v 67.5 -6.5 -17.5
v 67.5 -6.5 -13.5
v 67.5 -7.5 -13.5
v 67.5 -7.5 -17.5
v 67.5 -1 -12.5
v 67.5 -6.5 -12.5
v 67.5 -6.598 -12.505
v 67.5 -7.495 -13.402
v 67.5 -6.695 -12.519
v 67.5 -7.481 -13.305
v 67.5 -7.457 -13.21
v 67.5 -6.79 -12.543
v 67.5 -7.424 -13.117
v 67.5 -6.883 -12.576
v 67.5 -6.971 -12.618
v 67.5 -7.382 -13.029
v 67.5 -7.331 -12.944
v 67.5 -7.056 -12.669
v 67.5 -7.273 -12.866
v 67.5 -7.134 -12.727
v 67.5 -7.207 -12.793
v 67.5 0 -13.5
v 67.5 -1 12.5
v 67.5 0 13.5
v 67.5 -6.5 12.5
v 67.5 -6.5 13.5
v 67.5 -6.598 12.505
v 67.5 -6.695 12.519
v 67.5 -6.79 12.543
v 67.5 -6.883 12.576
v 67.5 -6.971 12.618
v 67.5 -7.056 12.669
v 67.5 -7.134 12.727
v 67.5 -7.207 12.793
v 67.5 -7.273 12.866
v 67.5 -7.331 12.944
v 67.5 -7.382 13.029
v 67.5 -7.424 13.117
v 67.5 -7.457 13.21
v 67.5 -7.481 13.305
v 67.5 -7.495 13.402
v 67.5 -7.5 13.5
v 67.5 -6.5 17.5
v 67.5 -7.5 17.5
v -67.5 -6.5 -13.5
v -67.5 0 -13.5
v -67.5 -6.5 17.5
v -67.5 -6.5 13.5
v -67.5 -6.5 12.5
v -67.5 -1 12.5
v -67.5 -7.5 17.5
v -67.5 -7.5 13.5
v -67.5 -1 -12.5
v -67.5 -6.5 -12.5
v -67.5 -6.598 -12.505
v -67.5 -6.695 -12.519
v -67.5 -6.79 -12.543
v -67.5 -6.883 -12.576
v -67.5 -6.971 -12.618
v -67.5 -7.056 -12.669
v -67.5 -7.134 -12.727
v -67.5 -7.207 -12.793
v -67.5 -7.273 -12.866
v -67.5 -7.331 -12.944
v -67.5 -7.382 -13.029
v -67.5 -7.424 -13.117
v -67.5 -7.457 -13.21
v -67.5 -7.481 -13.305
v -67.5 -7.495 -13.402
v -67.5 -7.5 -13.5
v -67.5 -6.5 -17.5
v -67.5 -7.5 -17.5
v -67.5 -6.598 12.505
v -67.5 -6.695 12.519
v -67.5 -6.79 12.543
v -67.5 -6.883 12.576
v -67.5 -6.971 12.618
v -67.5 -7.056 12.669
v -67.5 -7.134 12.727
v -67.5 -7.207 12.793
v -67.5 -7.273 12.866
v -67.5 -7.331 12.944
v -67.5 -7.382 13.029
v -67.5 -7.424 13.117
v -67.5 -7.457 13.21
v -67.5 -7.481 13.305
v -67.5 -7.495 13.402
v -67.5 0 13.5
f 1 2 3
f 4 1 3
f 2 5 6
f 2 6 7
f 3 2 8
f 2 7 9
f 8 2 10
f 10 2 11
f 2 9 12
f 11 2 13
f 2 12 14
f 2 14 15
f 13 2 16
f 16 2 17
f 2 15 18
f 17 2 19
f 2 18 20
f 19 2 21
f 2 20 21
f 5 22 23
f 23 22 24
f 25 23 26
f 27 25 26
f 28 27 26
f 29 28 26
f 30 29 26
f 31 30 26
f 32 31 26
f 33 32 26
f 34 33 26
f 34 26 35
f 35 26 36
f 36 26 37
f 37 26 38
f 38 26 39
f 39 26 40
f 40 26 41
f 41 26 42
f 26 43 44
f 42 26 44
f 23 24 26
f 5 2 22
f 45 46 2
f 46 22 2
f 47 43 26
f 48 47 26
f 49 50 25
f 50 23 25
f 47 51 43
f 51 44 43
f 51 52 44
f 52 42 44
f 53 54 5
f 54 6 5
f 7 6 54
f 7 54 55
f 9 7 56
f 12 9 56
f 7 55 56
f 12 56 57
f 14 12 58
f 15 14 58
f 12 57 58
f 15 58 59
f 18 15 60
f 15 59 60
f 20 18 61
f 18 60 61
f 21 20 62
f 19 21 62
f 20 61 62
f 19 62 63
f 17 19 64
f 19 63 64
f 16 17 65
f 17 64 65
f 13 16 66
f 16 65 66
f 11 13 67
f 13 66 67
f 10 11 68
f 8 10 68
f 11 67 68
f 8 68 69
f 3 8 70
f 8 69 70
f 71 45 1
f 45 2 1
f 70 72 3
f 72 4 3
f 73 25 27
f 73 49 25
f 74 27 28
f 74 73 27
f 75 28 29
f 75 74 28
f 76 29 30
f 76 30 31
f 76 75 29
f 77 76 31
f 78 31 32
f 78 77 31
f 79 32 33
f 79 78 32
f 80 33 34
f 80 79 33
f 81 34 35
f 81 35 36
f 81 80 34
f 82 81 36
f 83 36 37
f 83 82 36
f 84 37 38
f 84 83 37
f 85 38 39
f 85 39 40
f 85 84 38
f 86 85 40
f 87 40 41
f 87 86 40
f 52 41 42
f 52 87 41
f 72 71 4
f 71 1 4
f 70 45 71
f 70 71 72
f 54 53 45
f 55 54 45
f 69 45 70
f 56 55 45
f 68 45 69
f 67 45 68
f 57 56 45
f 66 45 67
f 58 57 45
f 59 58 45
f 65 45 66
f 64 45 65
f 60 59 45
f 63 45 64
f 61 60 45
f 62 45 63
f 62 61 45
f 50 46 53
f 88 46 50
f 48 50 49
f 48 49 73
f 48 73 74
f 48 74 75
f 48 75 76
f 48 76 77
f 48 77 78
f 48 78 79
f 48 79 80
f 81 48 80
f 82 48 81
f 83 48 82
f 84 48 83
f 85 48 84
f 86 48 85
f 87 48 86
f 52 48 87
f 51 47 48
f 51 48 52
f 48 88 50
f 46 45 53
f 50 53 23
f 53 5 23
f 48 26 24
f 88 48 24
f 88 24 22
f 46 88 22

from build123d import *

# Parameters (mm, degrees)
PAD005_DEPTH = 67.5
FILLET_R     = 1
FILLET001_R  = 1


with BuildPart() as part:
    # Sketch005 → Pad005 (new body, symmetric)
    with BuildSketch(Plane.YZ):
        Polygon((0, 13.5), (0, -13.5), (-6.5, -13.5), (-6.5, -17.5), (-7.5, -17.5), (-7.5, -12.5), (-1, -12.5), (-1, 12.5), (-7.5, 12.5), (-7.5, 17.5), (-6.5, 17.5), (-6.5, 13.5), align=None)
    extrude(amount=PAD005_DEPTH, both=True)

    # Fillet
    fillet_edges = [part.edges().sort_by_distance(p)[0] for p in [
        (0, -7.5, -12.5),
    ]]
    fillet(fillet_edges, radius=FILLET_R)

    # Fillet001
    fillet001_edges = [part.edges().sort_by_distance(p)[0] for p in [
        (0, -7.5, 12.5),
    ]]
    fillet(fillet001_edges, radius=FILLET001_R)


solid = part.part
